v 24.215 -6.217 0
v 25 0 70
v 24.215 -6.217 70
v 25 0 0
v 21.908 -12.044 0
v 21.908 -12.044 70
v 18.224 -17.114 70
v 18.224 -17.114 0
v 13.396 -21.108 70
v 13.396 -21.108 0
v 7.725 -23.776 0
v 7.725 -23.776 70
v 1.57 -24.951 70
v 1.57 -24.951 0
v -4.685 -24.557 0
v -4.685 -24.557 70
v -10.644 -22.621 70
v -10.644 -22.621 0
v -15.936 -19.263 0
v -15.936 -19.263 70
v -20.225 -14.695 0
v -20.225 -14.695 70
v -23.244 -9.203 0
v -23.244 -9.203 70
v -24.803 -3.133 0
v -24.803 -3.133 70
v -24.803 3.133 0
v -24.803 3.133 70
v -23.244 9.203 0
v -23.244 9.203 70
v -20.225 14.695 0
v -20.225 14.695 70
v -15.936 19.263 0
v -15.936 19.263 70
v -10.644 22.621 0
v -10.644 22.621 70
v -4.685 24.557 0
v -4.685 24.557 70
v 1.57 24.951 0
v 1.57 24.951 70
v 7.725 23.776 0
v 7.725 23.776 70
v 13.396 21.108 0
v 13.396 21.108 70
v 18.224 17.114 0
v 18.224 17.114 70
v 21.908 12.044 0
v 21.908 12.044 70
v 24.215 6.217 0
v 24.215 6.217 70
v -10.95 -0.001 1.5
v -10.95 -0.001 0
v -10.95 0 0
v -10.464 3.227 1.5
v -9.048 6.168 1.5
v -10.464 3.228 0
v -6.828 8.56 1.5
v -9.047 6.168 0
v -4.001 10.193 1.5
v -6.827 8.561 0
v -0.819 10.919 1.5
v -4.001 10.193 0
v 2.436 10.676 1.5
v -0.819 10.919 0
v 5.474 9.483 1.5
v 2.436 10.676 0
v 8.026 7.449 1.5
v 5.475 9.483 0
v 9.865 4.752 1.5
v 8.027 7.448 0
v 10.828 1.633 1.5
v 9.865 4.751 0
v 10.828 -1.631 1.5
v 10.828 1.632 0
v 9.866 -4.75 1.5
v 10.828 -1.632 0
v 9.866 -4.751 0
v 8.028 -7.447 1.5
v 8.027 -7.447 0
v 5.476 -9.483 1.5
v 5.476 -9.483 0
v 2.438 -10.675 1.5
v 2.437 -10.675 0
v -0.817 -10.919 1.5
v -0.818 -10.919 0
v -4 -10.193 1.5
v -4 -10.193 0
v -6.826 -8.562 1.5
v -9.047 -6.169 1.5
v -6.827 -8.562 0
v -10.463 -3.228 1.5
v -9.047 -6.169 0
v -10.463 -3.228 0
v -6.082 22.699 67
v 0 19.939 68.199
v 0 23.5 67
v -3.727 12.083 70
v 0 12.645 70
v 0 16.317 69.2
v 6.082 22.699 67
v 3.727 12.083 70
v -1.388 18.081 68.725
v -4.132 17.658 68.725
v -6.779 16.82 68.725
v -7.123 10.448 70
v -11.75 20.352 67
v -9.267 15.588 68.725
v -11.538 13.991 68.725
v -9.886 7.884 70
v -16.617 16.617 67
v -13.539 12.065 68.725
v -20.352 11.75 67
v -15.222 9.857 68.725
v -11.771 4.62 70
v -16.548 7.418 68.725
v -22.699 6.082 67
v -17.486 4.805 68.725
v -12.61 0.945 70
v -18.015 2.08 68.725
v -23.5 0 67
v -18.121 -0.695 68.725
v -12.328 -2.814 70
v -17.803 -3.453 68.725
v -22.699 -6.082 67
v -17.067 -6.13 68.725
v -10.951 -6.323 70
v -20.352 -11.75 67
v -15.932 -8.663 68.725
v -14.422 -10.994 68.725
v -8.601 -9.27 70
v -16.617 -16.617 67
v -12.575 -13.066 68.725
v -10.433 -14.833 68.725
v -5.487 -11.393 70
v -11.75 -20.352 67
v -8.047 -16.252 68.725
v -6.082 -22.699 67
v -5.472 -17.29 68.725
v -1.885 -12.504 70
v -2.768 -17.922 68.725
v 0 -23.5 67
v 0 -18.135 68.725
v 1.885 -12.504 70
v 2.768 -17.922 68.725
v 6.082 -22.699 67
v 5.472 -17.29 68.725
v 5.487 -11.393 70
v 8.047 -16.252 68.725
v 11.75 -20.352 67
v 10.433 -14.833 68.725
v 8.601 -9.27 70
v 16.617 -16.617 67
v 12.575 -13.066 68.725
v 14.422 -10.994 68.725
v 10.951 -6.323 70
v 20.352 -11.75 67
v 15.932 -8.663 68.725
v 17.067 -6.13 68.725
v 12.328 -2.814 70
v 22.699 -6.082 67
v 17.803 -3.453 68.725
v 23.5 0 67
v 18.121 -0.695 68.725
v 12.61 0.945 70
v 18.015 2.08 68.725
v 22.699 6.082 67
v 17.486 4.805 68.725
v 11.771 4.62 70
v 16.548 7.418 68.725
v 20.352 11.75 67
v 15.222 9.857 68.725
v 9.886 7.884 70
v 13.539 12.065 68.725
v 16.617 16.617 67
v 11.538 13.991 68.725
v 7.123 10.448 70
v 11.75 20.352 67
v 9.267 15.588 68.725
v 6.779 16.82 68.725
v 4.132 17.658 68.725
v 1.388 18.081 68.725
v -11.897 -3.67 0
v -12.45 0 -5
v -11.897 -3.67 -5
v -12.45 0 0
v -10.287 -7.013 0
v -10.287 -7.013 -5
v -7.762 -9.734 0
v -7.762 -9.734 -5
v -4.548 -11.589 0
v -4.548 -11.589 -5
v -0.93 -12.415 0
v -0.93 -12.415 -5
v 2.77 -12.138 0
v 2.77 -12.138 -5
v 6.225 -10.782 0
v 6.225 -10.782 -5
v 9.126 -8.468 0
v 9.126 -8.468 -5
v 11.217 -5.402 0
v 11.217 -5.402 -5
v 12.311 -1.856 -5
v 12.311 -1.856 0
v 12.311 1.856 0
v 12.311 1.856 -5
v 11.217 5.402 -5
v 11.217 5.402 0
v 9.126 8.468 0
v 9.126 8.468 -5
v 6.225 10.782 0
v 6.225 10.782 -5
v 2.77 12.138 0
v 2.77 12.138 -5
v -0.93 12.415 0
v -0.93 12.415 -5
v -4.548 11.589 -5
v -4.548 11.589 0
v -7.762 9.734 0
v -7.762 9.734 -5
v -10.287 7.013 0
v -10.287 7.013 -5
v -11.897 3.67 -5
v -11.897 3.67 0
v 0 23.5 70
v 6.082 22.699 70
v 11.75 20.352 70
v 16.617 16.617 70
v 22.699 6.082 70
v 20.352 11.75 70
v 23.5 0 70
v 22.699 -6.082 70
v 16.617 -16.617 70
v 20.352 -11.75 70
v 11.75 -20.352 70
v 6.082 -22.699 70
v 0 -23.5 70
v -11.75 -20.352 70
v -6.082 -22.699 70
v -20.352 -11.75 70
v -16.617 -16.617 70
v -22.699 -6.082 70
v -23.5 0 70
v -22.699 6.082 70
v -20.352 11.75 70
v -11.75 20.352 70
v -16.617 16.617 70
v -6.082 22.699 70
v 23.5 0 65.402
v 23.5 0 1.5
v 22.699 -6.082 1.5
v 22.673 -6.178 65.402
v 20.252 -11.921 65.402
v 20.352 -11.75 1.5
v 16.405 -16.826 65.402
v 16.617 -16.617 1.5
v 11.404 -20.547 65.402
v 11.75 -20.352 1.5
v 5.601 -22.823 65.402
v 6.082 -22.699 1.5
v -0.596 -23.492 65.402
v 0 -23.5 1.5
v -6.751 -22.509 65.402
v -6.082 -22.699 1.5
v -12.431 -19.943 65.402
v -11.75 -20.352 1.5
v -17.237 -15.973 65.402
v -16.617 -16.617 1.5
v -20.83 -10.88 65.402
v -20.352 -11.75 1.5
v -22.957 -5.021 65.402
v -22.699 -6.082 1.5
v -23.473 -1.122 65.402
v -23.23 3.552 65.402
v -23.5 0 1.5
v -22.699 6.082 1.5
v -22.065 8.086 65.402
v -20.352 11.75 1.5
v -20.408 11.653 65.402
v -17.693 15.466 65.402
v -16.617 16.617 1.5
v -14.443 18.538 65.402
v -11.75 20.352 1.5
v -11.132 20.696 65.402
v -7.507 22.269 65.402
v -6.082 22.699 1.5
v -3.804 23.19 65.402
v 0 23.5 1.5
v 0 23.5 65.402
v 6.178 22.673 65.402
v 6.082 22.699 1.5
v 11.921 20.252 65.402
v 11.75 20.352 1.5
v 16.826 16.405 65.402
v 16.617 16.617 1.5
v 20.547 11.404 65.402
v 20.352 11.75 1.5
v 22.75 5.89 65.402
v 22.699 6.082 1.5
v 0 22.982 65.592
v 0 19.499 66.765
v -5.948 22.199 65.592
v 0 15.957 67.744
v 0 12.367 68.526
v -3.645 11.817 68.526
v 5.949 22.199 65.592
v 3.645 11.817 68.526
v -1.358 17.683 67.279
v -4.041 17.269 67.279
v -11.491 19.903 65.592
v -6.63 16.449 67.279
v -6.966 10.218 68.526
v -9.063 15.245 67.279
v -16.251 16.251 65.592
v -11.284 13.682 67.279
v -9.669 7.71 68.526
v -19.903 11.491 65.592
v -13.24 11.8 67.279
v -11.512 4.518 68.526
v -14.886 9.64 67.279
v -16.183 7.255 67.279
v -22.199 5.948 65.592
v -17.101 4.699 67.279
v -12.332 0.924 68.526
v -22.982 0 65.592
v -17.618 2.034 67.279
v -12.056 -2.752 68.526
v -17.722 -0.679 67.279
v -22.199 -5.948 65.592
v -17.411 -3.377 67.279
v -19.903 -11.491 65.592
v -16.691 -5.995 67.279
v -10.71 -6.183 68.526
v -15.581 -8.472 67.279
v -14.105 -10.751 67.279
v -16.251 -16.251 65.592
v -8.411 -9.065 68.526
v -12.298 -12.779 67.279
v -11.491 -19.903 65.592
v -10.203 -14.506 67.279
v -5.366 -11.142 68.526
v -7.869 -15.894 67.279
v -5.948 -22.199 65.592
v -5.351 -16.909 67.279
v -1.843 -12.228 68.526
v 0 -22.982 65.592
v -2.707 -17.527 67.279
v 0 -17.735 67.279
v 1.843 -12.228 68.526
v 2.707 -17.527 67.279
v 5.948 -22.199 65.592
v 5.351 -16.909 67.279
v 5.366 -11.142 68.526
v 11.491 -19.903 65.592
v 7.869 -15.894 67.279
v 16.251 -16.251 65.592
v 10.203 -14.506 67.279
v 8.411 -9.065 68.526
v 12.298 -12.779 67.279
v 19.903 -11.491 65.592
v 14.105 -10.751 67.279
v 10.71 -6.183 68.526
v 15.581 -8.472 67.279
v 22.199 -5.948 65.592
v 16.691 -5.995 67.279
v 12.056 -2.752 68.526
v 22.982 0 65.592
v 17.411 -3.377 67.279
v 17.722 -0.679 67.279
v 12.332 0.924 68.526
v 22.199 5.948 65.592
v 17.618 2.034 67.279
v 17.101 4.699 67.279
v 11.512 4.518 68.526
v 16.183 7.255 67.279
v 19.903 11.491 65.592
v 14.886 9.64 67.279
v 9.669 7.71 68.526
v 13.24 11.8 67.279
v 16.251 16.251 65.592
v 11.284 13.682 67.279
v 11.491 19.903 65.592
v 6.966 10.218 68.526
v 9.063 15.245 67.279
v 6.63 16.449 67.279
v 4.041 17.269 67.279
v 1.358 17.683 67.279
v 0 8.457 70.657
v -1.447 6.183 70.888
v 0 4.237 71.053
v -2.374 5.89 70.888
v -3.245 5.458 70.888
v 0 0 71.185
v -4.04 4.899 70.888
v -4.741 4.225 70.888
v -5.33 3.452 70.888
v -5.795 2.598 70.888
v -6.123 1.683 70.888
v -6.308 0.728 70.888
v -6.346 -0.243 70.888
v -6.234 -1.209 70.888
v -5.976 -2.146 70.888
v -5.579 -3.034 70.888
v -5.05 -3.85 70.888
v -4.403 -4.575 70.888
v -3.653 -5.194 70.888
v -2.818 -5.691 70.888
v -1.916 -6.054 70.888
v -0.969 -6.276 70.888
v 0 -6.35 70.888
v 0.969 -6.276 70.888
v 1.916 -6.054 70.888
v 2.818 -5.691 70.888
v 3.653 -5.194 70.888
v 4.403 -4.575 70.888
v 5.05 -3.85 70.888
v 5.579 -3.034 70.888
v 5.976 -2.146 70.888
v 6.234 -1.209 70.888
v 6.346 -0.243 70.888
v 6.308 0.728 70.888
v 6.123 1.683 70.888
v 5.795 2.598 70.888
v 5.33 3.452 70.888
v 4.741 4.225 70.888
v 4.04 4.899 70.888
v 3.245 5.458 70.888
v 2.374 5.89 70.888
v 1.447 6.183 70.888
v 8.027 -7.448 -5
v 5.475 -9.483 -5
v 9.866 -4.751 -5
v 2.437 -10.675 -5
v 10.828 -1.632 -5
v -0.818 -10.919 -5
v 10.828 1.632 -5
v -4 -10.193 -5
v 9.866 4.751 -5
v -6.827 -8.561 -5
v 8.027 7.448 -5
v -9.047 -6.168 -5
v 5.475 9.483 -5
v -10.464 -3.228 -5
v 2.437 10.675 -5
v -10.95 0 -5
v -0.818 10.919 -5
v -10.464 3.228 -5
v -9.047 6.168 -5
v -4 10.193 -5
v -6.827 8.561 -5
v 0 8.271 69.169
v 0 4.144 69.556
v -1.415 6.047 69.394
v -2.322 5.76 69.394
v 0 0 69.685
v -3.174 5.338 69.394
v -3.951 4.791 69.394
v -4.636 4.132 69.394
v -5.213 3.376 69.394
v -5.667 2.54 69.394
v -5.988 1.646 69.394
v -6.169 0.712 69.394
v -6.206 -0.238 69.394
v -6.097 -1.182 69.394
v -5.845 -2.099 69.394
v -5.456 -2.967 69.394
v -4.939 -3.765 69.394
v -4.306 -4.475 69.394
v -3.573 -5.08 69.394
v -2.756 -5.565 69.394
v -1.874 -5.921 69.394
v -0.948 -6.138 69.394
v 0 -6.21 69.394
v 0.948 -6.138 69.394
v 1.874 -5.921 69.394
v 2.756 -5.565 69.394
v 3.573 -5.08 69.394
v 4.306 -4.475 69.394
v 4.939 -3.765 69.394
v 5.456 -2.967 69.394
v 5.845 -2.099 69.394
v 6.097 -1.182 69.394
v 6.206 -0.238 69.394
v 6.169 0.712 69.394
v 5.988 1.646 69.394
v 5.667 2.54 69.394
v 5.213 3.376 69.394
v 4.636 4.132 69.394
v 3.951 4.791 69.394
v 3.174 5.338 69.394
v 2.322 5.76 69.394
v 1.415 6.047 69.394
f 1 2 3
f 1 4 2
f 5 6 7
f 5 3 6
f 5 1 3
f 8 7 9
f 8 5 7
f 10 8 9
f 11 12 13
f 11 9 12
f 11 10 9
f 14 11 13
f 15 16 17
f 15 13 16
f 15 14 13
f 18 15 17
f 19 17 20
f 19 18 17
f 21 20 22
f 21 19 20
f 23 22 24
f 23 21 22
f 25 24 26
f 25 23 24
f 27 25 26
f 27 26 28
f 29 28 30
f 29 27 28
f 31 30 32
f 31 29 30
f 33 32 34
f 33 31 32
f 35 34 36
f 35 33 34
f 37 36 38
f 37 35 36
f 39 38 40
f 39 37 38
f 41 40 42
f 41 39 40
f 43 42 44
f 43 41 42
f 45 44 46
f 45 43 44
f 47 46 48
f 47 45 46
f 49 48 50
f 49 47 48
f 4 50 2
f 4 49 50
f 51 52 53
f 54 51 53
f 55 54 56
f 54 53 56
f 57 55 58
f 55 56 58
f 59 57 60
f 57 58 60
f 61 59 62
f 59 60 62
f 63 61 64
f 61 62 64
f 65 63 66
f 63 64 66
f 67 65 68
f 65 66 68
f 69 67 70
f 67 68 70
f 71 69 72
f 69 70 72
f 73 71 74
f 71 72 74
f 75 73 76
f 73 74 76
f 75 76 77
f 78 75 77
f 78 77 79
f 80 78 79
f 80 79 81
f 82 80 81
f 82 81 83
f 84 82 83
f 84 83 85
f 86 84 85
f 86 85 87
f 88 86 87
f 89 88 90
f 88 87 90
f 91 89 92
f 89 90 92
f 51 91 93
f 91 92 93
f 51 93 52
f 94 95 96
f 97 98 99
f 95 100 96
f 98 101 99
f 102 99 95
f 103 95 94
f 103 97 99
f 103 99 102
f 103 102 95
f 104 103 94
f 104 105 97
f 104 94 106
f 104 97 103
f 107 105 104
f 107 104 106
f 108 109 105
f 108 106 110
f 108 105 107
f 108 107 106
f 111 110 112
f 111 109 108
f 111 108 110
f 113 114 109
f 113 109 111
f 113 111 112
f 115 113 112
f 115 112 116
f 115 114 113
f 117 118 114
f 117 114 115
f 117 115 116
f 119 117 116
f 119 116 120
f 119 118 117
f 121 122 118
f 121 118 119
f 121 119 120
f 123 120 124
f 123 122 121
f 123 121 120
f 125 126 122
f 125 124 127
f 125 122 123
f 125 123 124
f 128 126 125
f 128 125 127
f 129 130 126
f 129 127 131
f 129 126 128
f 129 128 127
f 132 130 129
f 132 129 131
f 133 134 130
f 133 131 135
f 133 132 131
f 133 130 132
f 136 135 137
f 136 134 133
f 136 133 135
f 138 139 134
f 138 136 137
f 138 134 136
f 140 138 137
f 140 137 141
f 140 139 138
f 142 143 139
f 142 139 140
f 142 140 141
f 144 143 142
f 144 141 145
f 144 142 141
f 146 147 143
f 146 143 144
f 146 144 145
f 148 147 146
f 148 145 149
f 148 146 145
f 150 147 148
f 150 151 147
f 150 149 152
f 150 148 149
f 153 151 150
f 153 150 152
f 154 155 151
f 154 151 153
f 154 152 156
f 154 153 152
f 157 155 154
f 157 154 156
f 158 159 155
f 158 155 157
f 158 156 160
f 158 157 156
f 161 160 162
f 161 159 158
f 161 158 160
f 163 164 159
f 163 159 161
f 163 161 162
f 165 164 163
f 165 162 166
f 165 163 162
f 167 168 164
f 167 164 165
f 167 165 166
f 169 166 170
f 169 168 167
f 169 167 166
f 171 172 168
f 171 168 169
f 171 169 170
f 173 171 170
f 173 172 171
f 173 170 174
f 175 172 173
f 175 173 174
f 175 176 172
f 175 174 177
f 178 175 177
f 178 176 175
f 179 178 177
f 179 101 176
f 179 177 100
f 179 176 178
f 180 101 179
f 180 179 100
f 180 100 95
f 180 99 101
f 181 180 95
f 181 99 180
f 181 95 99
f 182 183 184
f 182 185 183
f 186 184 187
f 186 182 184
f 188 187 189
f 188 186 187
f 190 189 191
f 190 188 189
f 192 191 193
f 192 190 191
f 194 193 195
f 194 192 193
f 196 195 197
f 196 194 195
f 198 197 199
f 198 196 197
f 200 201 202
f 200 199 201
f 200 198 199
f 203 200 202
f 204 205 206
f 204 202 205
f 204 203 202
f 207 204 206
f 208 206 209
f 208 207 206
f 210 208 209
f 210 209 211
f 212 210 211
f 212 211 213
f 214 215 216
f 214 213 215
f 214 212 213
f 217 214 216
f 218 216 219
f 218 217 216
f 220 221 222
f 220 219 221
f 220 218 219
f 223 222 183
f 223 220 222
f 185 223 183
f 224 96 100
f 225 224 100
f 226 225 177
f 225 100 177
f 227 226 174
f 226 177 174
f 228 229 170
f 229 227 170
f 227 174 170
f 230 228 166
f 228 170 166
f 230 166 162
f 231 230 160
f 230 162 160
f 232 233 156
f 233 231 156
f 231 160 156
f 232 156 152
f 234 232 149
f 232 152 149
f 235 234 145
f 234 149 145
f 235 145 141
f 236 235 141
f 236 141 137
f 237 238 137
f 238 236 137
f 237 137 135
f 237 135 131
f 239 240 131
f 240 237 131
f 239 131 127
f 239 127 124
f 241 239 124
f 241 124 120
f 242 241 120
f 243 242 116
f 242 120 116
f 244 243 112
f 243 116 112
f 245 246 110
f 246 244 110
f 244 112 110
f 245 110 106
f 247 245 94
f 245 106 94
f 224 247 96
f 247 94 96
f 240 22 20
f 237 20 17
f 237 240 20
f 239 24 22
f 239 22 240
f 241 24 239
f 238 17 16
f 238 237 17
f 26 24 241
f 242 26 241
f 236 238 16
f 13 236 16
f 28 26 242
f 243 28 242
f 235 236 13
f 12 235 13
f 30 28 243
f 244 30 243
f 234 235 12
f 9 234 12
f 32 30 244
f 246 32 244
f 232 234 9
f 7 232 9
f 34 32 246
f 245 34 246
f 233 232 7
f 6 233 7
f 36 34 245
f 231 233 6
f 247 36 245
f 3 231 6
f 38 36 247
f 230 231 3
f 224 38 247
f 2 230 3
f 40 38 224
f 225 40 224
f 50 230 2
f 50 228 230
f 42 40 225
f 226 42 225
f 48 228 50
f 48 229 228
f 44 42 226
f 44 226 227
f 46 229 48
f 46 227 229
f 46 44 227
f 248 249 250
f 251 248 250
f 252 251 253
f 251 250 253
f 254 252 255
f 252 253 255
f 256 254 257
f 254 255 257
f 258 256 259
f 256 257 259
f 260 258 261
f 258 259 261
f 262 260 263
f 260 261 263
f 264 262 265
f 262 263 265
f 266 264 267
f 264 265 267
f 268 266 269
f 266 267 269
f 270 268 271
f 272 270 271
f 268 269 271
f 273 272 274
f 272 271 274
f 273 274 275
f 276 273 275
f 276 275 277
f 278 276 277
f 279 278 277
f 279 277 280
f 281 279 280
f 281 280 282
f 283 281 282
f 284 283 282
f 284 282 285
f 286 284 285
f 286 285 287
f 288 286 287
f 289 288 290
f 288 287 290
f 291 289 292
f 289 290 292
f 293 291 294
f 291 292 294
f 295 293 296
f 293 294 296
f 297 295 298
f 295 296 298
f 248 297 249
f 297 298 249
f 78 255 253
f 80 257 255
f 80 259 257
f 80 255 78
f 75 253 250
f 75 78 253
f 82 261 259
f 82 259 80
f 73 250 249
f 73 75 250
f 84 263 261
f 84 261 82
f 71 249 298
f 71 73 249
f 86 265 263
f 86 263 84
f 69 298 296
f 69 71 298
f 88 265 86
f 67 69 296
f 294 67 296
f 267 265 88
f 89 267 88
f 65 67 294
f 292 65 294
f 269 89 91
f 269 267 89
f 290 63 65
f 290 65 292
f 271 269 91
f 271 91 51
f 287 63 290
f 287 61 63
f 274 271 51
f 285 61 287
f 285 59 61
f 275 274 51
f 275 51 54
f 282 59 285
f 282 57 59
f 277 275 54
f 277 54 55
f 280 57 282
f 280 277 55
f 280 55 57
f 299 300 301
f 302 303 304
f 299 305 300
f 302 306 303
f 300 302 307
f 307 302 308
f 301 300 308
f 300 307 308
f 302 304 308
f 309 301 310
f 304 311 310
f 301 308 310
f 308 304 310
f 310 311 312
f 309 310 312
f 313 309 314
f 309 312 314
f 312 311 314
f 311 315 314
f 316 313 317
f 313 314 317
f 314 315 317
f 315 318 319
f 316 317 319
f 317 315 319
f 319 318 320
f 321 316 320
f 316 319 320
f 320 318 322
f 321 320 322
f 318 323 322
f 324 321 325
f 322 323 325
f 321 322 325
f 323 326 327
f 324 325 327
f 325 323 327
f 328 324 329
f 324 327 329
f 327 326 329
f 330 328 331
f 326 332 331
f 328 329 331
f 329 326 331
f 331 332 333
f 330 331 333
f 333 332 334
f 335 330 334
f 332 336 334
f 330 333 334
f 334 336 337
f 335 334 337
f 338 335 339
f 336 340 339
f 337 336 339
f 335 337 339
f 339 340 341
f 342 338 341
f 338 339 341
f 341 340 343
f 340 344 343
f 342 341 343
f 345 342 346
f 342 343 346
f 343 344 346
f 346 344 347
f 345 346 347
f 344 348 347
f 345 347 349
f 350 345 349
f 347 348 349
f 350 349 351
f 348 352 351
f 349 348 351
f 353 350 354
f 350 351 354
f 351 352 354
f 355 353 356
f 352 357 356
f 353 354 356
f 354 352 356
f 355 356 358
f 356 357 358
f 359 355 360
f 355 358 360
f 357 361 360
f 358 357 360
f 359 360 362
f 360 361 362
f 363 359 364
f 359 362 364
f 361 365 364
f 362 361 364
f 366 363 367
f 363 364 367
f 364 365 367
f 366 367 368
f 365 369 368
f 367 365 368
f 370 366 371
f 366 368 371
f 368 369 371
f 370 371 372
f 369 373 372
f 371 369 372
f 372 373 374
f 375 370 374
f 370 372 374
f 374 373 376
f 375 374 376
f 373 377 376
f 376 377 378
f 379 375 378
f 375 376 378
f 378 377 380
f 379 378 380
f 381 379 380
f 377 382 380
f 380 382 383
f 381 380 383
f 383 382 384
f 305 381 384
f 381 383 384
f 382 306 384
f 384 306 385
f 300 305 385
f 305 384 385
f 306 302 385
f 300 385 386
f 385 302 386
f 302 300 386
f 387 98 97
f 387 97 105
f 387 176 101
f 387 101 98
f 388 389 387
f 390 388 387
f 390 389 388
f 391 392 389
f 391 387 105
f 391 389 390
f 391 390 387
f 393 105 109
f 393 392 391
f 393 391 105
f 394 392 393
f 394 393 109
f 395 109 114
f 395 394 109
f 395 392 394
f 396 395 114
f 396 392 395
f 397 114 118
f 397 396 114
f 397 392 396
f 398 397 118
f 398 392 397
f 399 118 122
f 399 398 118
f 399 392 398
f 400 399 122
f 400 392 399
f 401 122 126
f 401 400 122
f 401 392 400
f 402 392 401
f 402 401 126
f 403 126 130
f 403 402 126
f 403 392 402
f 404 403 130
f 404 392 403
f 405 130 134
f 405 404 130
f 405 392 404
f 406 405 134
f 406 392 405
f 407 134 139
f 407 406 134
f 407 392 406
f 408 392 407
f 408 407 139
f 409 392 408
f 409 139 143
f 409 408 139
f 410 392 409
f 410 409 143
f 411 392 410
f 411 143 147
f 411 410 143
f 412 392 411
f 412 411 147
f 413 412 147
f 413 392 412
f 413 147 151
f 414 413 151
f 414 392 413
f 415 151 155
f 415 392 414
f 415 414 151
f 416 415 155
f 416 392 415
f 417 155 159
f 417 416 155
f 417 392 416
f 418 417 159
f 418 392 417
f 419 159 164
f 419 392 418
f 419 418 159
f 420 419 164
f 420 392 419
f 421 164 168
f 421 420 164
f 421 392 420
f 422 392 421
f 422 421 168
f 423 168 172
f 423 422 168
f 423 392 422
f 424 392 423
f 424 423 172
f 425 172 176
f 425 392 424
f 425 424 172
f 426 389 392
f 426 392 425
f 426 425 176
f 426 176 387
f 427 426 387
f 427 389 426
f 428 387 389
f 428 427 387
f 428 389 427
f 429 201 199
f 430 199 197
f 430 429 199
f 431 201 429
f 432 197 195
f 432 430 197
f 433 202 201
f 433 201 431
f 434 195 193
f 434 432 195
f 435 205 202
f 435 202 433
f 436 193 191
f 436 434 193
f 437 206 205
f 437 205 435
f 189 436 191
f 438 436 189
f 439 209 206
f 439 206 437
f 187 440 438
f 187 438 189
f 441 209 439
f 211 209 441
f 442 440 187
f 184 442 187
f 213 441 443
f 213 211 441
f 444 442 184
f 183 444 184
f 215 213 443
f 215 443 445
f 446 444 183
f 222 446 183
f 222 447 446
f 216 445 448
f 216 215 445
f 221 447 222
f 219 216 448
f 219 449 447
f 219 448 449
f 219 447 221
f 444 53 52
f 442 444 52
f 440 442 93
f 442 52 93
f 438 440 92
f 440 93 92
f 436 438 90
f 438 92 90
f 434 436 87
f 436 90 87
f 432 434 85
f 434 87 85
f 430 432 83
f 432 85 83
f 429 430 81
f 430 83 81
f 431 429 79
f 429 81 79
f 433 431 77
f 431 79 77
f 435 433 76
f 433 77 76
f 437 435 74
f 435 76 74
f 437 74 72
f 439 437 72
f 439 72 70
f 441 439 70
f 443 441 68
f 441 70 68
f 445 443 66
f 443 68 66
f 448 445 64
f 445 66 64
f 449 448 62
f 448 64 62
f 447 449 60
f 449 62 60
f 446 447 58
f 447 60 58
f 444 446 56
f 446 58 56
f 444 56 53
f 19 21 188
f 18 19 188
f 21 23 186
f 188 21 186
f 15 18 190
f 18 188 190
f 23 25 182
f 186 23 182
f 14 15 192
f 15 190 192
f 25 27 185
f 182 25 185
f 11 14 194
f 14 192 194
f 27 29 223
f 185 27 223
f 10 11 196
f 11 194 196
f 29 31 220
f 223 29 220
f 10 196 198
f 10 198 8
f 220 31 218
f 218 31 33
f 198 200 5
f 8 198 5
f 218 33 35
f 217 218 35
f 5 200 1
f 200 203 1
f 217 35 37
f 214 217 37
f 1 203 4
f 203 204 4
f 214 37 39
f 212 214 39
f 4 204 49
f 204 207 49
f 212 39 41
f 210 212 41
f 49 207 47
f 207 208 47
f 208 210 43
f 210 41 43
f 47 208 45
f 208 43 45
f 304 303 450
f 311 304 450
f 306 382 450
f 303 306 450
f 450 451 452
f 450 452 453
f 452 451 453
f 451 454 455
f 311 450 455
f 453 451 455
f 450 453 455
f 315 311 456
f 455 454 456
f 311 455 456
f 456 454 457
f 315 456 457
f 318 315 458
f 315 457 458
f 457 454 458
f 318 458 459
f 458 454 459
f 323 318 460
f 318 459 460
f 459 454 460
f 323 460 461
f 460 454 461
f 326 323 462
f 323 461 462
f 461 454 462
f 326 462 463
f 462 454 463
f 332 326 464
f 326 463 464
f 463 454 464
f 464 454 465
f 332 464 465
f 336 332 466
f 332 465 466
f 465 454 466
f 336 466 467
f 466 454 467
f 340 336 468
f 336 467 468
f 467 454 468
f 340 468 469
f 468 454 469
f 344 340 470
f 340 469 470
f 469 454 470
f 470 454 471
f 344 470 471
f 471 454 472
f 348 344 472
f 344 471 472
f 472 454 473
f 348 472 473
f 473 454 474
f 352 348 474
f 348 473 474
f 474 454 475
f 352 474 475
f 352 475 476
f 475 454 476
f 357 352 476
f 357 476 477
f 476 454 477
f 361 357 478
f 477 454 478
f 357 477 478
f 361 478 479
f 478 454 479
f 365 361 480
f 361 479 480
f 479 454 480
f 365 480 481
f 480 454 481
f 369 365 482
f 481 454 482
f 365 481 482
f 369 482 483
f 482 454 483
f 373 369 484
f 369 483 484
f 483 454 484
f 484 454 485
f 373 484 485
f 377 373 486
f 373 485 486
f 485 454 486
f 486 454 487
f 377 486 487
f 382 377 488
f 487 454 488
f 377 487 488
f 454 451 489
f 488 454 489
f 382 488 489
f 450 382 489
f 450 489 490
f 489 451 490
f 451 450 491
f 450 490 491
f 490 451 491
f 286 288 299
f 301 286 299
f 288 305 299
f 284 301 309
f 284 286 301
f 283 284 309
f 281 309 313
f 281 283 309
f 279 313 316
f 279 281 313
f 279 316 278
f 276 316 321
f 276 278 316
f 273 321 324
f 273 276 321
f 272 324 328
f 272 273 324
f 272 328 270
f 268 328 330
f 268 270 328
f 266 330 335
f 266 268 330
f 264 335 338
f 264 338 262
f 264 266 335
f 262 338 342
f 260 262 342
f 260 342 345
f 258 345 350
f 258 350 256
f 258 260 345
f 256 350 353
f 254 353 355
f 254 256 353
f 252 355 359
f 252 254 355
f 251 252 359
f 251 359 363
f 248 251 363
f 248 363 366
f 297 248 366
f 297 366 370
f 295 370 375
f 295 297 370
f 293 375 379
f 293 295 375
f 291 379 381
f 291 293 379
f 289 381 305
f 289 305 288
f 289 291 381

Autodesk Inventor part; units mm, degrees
ref_plane "YZ Plane" through (0, 0, 0) normal (1, 0, 0) x (0, 1, 0)
ref_plane "XZ Plane" through (0, 0, 0) normal (0, 1, 0) x (-1, 0, 0)
ref_plane "XY Plane" through (0, 0, 0) normal (0, 0, 1) x (1, 0, 0)
sketch "Sketch1" plane through (0, 0, 0) normal (0, 0, 1) x (1, 0, 0)
  circle A0 centre (0, 0) radius 25
  dimension "d0" = 50
extrude "Lens Body" add sketch "Sketch1" along normal blind 70
sketch "Sketch2" plane through (0, 0, 0) normal (0, 0, -1) x (-1, 0, 0)
  circle A0 centre (0, 0) radius 12.45
  circle A1 centre (0, 0) radius 10.95
  dimension "d3" = 24.9
  dimension "d4" = 1.5
extrude "Camera Mount" add sketch "Sketch2" along normal blind 5
sketch "Sketch4" plane through (0, 0, 0) normal (1, 0, 0) x (0, 1, 0)
  line L0 (25, 70) -> (-25, 70) projected
  line L1 (25, 0) -> (-25, 0) projected
  line L2 (25, 70) -> (-25, 70) projected
  line L3 (-25, 0) -> (-25, 70) projected
  line L4 (25, 70) -> (-25, 70)
  line L5 (-25, 70) -> (-25, 67)
  line L6 (-25, 67) -> (25, 67)
  line L7 (25, 67) -> (25, 70)
  line L8 (25, 70) -> (-25, 70) projected
  line L9 (23.5, 70) -> (23.5, 67)
  line L10 (0, 70) -> (0, 67)
  line L11 (-23.5, 70) -> (-23.5, 67)
  arc A0 (23.5, 67) -> (-23.5, 67) centre (0, 3.1082) ccw
  line L12 (0, -20.2369) -> (0, 86.4217) projected
  point P0 (0, 0)
  point P1 (12.6451, 70)
  point P2 (0, 71.1847)
  dimension "d7" = 3
  dimension "d8" = 47
revolve "Remove Material" cut sketch "Sketch4" angle 360 about axis through (0, 0, -10) along (0, 0, 1) contours L9 A0 L0
revolve "Convex Lens Shape" add sketch "Sketch4" angle 360 about axis through (0, 0, -10) along (0, 0, 1) picked at (7.0342, 70.2191) contours L0 L12 A0
shell "Hollow Out" thickness 1.5 removed faces 1 at (3.1259, -0.8227, 0)
properties part number "35mmLens"
